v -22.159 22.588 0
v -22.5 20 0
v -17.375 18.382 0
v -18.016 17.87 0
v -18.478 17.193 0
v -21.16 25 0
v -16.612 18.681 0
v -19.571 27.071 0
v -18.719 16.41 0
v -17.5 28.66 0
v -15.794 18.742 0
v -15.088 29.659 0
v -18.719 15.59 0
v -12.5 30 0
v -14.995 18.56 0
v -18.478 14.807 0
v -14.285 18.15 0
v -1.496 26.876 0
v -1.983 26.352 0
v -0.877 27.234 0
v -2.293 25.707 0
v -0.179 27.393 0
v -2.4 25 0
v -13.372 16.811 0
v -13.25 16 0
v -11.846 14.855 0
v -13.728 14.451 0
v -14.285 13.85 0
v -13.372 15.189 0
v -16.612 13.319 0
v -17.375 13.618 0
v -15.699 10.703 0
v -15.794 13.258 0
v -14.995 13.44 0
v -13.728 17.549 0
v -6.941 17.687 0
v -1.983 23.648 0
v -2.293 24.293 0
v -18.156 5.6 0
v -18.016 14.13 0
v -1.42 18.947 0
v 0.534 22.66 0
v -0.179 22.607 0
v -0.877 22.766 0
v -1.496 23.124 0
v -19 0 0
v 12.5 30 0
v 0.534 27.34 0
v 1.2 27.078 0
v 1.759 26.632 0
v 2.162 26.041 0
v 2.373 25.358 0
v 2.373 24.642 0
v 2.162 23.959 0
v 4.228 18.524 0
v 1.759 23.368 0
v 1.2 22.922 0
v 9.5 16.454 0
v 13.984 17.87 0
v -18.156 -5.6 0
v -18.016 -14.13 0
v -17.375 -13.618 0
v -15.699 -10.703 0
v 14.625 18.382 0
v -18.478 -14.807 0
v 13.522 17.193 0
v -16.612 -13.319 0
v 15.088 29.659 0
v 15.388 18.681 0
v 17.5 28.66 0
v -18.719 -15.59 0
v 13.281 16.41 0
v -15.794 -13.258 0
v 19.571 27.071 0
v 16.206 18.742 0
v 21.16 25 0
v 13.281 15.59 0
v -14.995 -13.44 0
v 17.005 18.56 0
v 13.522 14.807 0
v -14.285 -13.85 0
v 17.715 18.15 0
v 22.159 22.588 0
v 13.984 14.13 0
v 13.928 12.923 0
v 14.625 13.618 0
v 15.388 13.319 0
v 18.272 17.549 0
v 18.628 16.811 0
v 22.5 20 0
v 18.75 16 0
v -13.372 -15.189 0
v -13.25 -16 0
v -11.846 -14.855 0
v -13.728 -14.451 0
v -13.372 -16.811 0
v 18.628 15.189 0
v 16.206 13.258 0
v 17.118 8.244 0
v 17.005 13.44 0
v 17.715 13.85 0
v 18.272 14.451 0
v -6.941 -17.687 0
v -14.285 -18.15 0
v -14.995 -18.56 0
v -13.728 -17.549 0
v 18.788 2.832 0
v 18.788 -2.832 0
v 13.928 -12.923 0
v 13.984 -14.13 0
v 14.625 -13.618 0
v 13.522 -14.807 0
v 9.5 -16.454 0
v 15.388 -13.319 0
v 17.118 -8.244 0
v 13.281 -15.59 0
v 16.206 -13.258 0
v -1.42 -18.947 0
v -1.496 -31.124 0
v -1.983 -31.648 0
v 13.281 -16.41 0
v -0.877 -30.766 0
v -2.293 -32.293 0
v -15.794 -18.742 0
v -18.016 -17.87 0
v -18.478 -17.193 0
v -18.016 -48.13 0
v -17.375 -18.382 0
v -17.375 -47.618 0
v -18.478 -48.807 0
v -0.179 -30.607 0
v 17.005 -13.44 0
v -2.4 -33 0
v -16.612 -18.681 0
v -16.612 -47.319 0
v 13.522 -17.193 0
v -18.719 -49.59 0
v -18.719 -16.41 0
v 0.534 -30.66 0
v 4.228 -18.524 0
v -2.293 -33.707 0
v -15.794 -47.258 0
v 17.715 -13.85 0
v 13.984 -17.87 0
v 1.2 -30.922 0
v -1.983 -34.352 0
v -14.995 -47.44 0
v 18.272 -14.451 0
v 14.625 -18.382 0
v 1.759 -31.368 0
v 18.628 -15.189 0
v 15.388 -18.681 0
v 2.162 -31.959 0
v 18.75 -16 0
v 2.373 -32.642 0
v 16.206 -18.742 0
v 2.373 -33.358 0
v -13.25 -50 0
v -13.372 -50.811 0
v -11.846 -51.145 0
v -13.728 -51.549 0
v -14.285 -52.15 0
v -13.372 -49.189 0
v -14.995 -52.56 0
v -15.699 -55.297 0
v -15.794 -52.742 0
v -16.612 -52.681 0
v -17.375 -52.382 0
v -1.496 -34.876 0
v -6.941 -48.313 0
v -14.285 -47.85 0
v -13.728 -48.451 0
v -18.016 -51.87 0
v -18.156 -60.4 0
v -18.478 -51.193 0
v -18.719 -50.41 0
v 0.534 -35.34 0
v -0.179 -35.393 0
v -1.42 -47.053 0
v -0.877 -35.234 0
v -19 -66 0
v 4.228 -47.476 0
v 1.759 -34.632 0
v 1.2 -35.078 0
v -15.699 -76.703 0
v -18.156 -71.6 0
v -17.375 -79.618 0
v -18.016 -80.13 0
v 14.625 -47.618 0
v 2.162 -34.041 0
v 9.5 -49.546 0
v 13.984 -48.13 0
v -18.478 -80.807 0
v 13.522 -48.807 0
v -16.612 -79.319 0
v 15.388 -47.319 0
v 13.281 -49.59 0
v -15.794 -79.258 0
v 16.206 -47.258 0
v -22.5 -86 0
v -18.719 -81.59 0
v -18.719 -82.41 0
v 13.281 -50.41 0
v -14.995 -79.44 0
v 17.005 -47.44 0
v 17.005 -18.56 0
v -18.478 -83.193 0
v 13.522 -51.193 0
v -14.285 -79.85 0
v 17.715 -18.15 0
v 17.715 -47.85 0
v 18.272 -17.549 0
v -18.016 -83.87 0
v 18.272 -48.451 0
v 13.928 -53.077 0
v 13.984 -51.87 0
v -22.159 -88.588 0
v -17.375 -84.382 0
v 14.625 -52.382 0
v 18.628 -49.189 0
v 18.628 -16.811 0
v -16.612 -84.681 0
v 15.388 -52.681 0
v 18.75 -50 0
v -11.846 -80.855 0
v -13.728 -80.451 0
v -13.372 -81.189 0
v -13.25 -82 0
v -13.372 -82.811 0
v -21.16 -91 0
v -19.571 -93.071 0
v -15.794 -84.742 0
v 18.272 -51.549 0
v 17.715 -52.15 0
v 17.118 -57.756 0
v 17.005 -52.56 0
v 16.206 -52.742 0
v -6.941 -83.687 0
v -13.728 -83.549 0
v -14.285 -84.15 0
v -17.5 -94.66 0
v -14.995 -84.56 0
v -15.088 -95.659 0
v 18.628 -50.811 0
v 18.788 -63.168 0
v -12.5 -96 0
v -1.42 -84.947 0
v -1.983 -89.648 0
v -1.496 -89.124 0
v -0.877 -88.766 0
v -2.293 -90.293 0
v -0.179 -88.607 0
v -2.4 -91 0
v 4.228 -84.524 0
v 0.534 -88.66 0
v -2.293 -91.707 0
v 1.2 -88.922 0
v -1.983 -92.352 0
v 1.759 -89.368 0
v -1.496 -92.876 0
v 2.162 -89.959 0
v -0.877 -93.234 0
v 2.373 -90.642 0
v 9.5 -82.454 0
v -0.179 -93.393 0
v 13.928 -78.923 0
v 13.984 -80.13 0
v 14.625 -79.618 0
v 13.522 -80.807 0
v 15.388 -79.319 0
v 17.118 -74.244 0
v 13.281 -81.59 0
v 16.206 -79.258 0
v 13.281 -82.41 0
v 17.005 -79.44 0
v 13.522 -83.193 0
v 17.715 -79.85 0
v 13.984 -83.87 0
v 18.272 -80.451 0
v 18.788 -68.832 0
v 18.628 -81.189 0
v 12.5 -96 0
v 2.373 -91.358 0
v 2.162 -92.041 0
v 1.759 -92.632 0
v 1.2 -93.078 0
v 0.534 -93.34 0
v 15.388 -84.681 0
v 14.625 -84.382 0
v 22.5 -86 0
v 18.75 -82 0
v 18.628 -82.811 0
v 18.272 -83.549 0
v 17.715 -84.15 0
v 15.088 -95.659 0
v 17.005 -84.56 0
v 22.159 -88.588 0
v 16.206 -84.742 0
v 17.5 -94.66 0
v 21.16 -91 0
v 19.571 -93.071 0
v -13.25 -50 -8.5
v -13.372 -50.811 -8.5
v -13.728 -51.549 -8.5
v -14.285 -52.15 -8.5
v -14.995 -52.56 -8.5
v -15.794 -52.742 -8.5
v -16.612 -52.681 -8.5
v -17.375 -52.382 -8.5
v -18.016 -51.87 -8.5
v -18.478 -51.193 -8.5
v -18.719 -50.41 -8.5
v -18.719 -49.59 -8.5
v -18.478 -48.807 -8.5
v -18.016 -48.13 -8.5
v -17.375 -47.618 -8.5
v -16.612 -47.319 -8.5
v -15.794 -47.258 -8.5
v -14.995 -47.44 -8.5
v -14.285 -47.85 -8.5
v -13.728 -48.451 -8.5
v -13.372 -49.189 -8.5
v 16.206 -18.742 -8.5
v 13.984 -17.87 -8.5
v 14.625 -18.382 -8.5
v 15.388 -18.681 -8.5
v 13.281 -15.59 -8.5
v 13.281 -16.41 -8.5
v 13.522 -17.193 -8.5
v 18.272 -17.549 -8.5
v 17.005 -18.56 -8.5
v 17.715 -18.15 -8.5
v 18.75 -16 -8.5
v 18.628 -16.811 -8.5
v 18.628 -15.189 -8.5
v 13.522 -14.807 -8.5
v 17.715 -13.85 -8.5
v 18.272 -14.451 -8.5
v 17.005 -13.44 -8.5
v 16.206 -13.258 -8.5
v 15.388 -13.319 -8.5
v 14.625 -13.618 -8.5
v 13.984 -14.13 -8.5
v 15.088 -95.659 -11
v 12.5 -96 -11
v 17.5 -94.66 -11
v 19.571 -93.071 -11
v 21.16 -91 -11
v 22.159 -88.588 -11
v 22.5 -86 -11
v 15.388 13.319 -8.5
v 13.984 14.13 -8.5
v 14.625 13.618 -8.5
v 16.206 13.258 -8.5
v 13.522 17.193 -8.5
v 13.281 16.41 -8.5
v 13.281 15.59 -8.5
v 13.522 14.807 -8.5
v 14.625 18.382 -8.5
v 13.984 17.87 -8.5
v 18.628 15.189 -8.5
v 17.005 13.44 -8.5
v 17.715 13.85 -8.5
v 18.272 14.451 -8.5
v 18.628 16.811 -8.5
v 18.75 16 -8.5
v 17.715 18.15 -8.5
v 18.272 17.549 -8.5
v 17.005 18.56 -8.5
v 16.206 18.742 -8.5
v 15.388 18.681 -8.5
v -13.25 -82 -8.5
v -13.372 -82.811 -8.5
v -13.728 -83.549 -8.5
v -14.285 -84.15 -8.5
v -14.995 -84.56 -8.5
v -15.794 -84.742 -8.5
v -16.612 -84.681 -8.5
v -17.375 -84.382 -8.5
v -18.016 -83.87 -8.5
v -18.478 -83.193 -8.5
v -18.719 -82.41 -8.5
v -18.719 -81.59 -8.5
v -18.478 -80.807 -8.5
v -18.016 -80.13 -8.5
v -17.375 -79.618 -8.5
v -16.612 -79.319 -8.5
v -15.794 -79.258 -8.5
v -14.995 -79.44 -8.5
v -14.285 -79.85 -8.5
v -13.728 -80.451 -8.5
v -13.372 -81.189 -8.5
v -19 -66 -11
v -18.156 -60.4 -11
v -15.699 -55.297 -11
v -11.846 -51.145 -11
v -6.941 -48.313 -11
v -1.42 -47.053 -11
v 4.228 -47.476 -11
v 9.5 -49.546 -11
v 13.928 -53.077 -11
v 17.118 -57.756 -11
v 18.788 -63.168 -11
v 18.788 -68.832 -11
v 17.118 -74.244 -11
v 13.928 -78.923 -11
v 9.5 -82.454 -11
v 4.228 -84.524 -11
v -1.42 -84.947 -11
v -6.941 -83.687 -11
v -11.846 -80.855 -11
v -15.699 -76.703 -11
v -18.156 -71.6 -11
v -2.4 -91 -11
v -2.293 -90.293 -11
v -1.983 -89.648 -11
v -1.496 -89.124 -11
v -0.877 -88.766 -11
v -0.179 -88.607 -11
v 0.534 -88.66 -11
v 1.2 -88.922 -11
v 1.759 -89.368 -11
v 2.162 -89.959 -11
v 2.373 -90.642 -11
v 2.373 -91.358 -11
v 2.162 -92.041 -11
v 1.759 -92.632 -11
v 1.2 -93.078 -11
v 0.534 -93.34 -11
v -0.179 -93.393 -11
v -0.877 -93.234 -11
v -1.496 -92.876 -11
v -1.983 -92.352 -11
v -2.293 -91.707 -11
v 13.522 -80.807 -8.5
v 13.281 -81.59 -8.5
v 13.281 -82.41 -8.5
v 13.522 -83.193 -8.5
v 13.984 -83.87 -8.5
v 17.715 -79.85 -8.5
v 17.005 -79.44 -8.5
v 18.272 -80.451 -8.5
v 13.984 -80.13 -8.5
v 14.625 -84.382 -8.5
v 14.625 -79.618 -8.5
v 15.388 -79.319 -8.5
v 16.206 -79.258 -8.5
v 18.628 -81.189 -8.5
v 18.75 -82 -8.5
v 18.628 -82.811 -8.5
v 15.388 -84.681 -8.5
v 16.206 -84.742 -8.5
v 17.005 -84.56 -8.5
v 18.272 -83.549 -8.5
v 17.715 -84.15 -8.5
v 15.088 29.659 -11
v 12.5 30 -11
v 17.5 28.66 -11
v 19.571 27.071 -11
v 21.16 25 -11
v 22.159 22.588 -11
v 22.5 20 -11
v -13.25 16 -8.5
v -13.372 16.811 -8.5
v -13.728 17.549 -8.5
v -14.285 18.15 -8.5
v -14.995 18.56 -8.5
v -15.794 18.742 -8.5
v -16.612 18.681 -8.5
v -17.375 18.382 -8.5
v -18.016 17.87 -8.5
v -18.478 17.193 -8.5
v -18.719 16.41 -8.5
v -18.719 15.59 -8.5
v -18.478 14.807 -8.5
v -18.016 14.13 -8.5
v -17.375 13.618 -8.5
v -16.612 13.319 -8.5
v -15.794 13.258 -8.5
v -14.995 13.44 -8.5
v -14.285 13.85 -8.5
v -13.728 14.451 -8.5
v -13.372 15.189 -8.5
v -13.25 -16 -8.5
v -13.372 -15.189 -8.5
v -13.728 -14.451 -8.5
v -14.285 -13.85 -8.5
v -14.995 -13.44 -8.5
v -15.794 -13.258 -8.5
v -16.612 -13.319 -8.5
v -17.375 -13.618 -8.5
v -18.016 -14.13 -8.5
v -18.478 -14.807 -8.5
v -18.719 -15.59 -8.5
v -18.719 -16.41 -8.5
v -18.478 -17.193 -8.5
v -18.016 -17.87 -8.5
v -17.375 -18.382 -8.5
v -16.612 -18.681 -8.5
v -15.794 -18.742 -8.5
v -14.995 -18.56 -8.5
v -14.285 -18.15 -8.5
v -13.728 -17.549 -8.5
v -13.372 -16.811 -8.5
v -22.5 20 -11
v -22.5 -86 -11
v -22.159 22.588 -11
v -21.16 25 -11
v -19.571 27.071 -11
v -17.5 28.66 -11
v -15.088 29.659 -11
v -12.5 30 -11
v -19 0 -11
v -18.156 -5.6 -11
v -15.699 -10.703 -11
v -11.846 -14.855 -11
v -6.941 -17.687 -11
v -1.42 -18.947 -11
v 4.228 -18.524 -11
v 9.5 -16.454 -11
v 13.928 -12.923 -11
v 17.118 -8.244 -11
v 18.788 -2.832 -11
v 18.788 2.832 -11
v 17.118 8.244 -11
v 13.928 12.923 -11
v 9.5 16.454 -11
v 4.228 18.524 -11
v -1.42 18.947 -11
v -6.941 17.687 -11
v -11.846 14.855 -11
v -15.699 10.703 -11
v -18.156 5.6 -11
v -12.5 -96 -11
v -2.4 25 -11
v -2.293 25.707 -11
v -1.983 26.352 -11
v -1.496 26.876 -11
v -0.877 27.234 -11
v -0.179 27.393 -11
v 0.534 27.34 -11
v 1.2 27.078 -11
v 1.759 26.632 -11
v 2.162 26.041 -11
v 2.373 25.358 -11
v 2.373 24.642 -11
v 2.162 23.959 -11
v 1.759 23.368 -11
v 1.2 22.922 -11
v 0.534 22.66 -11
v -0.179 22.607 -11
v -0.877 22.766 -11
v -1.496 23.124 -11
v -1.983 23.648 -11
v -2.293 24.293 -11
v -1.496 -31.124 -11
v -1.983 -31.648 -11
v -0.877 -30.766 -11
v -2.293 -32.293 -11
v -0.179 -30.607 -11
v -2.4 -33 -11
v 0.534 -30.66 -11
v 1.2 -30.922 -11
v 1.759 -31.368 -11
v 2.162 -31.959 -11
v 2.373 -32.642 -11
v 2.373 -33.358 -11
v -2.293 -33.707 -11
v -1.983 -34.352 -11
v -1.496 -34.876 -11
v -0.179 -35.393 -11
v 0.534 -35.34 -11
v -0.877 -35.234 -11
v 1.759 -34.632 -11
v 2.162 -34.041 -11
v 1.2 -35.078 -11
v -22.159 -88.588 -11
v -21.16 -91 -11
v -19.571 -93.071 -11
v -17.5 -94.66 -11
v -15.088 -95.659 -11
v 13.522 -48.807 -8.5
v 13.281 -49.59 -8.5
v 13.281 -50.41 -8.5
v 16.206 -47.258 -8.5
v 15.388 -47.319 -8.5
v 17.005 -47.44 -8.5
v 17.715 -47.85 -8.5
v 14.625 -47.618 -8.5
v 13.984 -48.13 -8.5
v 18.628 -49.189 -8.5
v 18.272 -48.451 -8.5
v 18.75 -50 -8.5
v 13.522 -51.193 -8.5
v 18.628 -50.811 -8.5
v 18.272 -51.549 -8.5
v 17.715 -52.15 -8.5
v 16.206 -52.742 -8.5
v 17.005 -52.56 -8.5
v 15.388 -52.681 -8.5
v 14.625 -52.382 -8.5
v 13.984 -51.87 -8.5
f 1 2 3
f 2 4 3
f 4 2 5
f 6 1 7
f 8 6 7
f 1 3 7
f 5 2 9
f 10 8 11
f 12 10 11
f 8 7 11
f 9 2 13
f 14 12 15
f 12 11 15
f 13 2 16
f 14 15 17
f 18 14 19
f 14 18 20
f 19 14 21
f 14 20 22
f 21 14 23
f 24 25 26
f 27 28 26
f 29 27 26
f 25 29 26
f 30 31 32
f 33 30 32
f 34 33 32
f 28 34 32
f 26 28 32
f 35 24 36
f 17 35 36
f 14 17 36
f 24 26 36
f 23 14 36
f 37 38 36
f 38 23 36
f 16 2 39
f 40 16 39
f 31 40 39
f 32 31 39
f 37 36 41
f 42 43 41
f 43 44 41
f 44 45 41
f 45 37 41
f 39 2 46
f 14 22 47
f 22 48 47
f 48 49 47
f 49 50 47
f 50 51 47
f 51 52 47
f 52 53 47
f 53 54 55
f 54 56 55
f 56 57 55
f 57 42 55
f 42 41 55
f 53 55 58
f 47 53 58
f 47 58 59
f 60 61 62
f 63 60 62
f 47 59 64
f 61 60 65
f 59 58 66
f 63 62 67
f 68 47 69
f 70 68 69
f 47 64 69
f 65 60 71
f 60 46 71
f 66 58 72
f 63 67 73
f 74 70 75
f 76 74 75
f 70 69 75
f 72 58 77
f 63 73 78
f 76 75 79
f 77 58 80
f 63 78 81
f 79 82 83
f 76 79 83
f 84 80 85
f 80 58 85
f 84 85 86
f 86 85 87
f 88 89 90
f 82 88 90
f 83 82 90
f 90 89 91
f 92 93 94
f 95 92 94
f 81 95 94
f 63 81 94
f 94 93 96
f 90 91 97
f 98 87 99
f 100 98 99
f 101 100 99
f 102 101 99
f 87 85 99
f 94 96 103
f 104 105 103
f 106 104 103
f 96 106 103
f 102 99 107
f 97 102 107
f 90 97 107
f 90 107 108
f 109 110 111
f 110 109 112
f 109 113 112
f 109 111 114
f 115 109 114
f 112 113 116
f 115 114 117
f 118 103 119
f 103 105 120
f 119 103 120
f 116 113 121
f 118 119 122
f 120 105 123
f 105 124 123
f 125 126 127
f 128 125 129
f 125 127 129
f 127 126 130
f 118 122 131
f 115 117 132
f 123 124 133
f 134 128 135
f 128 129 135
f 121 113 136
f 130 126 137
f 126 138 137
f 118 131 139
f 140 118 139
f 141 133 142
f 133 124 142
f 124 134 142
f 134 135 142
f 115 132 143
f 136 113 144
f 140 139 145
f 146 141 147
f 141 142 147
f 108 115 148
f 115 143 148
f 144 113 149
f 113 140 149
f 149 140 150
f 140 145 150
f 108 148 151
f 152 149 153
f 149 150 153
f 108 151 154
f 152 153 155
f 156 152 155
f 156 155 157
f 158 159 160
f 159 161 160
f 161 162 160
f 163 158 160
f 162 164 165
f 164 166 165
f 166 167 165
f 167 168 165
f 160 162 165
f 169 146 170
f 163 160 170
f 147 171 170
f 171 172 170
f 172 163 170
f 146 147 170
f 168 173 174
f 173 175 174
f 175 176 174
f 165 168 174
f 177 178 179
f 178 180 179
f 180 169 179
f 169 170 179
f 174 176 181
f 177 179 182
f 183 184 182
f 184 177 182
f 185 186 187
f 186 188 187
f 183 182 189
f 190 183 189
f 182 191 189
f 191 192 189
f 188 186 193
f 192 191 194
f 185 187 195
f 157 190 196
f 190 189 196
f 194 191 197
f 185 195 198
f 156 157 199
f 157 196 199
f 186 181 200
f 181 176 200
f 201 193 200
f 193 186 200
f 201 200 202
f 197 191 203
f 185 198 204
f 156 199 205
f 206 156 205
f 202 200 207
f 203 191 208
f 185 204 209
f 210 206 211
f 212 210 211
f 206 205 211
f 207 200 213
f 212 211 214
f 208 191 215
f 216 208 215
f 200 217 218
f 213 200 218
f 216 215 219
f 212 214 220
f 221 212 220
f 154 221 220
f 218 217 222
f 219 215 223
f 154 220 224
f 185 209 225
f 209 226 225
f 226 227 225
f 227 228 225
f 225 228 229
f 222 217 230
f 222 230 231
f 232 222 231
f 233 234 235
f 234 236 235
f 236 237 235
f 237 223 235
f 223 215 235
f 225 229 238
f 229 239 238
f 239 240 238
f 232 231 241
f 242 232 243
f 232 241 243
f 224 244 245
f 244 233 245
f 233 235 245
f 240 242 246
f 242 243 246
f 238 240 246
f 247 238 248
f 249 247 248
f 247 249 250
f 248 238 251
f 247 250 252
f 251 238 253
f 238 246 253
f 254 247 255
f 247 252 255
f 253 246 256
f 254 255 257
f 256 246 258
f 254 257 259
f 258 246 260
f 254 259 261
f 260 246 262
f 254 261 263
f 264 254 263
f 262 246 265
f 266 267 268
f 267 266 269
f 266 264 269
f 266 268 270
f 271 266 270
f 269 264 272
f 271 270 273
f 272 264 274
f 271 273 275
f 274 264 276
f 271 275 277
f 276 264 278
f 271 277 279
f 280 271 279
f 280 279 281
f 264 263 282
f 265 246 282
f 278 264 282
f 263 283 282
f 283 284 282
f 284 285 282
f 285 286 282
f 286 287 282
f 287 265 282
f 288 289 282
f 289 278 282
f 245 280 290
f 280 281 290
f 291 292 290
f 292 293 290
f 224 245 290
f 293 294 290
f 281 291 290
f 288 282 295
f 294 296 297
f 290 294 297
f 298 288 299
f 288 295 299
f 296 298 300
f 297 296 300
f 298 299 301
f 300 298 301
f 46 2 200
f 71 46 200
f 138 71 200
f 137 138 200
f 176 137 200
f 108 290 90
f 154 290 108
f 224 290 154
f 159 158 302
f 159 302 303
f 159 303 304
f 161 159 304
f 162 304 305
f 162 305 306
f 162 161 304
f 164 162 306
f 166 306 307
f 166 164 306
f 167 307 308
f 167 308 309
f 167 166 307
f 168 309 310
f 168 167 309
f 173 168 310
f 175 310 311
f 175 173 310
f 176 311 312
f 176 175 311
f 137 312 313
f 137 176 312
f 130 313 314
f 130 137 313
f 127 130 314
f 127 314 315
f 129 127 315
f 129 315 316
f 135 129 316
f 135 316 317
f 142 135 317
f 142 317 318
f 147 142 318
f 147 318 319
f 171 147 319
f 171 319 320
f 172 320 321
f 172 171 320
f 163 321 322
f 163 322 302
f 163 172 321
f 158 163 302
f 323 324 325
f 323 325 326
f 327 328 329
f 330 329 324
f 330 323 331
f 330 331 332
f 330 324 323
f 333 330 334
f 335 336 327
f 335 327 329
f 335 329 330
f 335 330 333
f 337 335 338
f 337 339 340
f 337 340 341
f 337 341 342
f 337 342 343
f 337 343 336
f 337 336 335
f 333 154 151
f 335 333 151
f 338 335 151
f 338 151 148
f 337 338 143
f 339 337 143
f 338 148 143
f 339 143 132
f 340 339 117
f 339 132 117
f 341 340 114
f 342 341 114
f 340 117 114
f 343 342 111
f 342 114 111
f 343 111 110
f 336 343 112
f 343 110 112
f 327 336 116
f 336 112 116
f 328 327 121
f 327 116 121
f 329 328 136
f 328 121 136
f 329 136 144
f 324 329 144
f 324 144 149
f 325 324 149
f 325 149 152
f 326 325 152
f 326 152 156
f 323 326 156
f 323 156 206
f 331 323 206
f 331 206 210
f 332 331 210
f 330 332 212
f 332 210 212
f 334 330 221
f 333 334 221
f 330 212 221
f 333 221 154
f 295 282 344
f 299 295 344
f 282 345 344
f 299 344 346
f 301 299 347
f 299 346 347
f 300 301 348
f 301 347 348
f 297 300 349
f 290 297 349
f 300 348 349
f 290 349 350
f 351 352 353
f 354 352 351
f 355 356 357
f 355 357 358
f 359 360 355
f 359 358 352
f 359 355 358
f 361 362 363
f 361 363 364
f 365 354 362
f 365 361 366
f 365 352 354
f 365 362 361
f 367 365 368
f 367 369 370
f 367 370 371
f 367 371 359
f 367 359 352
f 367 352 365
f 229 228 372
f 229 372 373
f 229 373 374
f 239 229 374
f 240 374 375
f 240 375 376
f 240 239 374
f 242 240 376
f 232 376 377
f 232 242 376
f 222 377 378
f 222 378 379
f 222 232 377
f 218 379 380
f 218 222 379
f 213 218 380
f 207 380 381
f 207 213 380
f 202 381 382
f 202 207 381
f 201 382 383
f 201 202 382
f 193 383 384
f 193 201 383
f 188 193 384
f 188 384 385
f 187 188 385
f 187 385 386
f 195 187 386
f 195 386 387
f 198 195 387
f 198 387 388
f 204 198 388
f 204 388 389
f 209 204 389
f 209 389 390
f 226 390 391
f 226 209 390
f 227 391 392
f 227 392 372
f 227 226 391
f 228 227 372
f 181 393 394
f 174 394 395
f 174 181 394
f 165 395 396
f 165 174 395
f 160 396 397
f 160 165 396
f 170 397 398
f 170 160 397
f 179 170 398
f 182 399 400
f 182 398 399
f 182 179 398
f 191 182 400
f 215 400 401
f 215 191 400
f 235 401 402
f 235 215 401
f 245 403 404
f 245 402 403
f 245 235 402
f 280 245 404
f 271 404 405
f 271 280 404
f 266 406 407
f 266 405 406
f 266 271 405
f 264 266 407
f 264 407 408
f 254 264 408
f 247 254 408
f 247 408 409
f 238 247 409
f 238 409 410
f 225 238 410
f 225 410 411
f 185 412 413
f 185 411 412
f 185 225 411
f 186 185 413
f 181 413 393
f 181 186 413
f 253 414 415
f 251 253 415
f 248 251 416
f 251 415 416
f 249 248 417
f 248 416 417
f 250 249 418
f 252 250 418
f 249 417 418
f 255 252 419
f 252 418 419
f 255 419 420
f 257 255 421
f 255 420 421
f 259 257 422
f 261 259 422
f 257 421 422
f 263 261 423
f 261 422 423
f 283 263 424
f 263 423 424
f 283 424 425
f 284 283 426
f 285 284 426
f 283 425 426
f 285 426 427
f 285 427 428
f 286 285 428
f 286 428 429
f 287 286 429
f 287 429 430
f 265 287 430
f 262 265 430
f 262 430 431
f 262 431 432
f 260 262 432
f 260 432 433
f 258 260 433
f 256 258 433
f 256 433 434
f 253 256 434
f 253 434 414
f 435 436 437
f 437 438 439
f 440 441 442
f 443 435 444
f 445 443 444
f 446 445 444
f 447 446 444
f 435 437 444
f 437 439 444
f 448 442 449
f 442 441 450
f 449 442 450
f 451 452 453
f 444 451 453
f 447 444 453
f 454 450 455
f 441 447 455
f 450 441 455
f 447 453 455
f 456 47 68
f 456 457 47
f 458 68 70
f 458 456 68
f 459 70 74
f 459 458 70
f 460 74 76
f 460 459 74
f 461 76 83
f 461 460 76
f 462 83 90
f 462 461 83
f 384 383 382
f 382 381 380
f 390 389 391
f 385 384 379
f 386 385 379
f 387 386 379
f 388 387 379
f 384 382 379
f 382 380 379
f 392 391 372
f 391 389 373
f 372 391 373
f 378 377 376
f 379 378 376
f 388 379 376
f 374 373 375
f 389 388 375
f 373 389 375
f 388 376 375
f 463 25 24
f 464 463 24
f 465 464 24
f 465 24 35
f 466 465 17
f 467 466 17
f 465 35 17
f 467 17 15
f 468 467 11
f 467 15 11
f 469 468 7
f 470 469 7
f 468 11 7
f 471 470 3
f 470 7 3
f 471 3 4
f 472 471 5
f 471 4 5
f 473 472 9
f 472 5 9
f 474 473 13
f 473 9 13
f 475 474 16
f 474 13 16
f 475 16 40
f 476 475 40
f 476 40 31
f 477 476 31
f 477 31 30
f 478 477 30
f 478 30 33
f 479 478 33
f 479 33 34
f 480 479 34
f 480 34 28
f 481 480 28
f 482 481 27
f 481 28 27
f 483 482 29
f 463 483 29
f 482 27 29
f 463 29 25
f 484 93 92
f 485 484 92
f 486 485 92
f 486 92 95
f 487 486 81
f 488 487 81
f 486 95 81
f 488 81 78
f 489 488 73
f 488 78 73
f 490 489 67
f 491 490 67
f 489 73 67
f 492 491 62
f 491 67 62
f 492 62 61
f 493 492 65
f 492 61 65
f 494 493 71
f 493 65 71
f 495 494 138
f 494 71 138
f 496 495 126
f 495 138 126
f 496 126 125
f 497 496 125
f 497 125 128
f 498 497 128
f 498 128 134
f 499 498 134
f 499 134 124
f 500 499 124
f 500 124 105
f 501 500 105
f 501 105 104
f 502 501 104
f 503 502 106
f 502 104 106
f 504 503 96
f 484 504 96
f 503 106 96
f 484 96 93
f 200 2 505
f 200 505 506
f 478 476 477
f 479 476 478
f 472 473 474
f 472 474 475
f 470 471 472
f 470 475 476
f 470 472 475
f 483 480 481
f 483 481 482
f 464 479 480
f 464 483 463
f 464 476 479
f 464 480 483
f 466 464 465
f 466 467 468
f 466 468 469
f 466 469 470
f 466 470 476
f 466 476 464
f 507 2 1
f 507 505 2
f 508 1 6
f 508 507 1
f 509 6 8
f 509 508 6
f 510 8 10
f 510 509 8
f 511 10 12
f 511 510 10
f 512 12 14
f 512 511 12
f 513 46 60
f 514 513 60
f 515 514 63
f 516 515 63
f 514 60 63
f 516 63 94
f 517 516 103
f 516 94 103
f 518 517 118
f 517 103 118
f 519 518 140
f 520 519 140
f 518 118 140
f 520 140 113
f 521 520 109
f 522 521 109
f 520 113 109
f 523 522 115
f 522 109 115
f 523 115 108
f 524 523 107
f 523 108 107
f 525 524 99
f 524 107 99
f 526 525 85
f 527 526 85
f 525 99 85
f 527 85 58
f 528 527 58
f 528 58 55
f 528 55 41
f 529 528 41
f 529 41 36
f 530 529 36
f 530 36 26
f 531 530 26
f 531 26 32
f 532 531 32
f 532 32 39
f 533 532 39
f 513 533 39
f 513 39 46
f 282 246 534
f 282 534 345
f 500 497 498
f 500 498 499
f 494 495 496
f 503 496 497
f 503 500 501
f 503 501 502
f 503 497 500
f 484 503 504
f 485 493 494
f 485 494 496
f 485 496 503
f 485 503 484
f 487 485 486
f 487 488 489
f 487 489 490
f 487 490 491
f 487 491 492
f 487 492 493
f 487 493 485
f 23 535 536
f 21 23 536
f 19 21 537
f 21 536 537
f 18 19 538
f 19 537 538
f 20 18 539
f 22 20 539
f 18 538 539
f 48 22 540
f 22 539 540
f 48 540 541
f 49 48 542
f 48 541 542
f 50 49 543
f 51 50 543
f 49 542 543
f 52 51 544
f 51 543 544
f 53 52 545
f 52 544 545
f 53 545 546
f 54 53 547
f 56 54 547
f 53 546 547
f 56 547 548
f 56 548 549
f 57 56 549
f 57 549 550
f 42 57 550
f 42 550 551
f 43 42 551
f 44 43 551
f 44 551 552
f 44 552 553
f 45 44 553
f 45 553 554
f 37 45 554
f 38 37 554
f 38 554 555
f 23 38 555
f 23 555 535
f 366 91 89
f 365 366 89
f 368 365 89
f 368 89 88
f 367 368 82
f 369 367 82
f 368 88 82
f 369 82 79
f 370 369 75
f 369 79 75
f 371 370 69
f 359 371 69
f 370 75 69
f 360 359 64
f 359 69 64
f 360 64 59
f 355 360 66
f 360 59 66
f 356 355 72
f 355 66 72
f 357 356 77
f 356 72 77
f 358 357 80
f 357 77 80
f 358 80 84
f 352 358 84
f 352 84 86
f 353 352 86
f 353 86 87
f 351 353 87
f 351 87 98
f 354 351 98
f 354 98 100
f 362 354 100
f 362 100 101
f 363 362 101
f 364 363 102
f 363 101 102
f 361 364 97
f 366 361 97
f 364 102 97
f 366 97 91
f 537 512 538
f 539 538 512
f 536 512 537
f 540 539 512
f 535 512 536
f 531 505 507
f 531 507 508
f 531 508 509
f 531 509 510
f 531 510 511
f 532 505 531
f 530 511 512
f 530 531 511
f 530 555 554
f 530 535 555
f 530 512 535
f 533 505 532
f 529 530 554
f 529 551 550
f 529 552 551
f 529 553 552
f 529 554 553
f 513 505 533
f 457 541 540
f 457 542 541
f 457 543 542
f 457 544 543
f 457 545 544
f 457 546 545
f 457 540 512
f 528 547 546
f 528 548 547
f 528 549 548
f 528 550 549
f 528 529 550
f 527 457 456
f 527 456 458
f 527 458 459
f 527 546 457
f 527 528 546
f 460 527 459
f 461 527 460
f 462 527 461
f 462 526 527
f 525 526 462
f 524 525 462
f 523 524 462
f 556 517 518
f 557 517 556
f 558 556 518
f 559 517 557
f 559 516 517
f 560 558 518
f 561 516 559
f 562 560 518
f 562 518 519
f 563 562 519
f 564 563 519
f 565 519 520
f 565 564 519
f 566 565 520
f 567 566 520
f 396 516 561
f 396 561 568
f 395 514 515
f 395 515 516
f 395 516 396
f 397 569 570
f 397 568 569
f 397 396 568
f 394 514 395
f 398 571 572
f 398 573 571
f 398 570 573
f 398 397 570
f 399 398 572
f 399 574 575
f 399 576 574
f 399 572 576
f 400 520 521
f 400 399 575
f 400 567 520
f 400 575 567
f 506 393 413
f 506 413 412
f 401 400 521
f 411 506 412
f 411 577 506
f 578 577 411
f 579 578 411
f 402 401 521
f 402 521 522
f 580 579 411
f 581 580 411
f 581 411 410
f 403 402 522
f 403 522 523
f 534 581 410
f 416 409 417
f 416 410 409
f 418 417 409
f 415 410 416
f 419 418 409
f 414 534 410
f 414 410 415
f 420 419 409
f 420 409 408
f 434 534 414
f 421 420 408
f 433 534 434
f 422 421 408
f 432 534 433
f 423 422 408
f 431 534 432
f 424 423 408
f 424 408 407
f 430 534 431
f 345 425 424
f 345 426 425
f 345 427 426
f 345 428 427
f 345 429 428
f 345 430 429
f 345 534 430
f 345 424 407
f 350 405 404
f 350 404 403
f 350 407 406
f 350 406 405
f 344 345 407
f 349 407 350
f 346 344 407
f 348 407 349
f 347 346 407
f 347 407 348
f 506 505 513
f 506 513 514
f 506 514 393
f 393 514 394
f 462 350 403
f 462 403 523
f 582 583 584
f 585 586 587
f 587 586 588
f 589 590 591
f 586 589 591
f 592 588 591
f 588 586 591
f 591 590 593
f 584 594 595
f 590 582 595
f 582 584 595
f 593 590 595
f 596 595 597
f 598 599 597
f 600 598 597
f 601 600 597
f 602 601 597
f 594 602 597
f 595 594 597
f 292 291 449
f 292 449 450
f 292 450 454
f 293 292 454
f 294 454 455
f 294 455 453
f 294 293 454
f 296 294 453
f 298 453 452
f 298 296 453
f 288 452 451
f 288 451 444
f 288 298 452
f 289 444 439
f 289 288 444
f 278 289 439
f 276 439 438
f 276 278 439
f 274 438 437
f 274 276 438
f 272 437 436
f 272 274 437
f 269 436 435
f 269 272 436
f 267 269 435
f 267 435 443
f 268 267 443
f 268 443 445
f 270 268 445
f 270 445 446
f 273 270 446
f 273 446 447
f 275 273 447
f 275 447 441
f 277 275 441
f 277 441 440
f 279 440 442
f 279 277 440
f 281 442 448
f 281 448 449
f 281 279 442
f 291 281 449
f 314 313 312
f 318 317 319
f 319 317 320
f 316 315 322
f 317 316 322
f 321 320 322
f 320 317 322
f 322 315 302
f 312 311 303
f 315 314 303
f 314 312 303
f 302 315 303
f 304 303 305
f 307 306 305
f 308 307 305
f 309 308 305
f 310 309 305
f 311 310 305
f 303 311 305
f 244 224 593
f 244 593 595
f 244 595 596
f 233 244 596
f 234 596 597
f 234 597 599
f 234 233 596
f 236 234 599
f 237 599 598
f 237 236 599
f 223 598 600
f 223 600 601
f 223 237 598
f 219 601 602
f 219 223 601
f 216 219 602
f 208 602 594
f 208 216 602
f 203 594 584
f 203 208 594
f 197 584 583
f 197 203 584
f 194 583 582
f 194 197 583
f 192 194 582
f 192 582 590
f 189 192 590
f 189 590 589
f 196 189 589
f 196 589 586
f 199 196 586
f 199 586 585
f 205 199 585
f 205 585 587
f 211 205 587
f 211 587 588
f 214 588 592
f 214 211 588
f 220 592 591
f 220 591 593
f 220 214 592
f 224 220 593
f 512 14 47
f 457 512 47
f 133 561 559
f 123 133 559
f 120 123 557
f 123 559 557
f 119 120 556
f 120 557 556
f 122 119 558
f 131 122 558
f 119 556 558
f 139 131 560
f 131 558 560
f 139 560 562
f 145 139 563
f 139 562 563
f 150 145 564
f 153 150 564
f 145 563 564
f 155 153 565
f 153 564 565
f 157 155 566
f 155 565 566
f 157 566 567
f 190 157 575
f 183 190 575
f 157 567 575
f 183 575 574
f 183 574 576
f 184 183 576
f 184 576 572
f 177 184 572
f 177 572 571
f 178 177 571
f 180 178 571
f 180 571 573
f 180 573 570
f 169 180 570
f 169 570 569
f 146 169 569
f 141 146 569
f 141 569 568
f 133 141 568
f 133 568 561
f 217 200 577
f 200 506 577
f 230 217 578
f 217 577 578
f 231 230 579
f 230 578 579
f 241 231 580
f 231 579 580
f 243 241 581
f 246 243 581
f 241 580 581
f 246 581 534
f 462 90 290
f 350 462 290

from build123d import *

# Parameters (mm, degrees)
SKETCH1_W            = 45
SKETCH1_H            = 60
BOSS_EXTRUDE1_DEPTH  = 11
SKETCH6_R            = 2.75
CUT_EXTRUDE2_DEPTH   = 8.5
CUT_EXTRUDE3_DEPTH   = 40.080046059
SKETCH11_W           = 45
SKETCH11_H           = 11
BOSS_EXTRUDE2_DEPTH  = 6
M4_CLEARANCE_HOLE2_D = 4.8
FILLET1_R            = 10


with BuildPart() as part:
    # Sketch1 → Boss-Extrude1 (new body)
    with BuildSketch(Plane.XY):
        Rectangle(SKETCH1_W, SKETCH1_H)
    boss_extrude1 = extrude(amount=-BOSS_EXTRUDE1_DEPTH)

    # Sketch6 → Cut-Extrude2 (cut)
    with BuildSketch(Plane.XY):
        with Locations((-16, 16)):
            Circle(SKETCH6_R)
        with Locations((16, 16)):
            Circle(SKETCH6_R)
        with Locations((16, -16)):
            Circle(SKETCH6_R)
        with Locations((-16, -16)):
            Circle(SKETCH6_R)
    cut_extrude2 = extrude(amount=-CUT_EXTRUDE2_DEPTH, mode=Mode.SUBTRACT)

    # Sketch7 → Cut-Extrude3 (cut, through all)
    with BuildSketch(Plane.XY):
        with BuildLine():
            ThreePointArc((19, 0), (0, 19), (-19, 0))
            ThreePointArc((-19, 0), (0, -19), (19, 0))
        make_face()
    cut_extrude3 = extrude(amount=-CUT_EXTRUDE3_DEPTH, mode=Mode.SUBTRACT)

    # Sketch11 → Boss-Extrude2 (add)
    with BuildSketch(Plane.XZ.offset(30)):
        with Locations((0, -5.5)):
            Rectangle(SKETCH11_W, SKETCH11_H)
    extrude(amount=BOSS_EXTRUDE2_DEPTH)

    # Mirror1: Boss-Extrude1, Cut-Extrude2, Cut-Extrude3 across plane
    add(boss_extrude1.mirror(Plane(origin=(0, -33, 0), x_dir=(0, 0, 1), z_dir=(0, -1, 0))))
    add(cut_extrude2.mirror(Plane(origin=(0, -33, 0), x_dir=(0, 0, 1), z_dir=(0, -1, 0))), mode=Mode.SUBTRACT)
    add(cut_extrude3.mirror(Plane(origin=(0, -33, 0), x_dir=(0, 0, 1), z_dir=(0, -1, 0))), mode=Mode.SUBTRACT)

    # M4 Clearance Hole2 (through all)
    with Locations(Plane.XY):
        with Locations((0, -91), (0, -33), (0, 25)):
            Hole(M4_CLEARANCE_HOLE2_D / 2)

    # Fillet1
    fillet1_edges = [part.edges().sort_by_distance(p)[0] for p in [
        (22.5, -96, -5.5),
        (-22.5, -96, -5.5),
        (-22.5, 30, -5.5),
        (22.5, 30, -5.5),
    ]]
    fillet(fillet1_edges, radius=FILLET1_R)


solid = part.part
